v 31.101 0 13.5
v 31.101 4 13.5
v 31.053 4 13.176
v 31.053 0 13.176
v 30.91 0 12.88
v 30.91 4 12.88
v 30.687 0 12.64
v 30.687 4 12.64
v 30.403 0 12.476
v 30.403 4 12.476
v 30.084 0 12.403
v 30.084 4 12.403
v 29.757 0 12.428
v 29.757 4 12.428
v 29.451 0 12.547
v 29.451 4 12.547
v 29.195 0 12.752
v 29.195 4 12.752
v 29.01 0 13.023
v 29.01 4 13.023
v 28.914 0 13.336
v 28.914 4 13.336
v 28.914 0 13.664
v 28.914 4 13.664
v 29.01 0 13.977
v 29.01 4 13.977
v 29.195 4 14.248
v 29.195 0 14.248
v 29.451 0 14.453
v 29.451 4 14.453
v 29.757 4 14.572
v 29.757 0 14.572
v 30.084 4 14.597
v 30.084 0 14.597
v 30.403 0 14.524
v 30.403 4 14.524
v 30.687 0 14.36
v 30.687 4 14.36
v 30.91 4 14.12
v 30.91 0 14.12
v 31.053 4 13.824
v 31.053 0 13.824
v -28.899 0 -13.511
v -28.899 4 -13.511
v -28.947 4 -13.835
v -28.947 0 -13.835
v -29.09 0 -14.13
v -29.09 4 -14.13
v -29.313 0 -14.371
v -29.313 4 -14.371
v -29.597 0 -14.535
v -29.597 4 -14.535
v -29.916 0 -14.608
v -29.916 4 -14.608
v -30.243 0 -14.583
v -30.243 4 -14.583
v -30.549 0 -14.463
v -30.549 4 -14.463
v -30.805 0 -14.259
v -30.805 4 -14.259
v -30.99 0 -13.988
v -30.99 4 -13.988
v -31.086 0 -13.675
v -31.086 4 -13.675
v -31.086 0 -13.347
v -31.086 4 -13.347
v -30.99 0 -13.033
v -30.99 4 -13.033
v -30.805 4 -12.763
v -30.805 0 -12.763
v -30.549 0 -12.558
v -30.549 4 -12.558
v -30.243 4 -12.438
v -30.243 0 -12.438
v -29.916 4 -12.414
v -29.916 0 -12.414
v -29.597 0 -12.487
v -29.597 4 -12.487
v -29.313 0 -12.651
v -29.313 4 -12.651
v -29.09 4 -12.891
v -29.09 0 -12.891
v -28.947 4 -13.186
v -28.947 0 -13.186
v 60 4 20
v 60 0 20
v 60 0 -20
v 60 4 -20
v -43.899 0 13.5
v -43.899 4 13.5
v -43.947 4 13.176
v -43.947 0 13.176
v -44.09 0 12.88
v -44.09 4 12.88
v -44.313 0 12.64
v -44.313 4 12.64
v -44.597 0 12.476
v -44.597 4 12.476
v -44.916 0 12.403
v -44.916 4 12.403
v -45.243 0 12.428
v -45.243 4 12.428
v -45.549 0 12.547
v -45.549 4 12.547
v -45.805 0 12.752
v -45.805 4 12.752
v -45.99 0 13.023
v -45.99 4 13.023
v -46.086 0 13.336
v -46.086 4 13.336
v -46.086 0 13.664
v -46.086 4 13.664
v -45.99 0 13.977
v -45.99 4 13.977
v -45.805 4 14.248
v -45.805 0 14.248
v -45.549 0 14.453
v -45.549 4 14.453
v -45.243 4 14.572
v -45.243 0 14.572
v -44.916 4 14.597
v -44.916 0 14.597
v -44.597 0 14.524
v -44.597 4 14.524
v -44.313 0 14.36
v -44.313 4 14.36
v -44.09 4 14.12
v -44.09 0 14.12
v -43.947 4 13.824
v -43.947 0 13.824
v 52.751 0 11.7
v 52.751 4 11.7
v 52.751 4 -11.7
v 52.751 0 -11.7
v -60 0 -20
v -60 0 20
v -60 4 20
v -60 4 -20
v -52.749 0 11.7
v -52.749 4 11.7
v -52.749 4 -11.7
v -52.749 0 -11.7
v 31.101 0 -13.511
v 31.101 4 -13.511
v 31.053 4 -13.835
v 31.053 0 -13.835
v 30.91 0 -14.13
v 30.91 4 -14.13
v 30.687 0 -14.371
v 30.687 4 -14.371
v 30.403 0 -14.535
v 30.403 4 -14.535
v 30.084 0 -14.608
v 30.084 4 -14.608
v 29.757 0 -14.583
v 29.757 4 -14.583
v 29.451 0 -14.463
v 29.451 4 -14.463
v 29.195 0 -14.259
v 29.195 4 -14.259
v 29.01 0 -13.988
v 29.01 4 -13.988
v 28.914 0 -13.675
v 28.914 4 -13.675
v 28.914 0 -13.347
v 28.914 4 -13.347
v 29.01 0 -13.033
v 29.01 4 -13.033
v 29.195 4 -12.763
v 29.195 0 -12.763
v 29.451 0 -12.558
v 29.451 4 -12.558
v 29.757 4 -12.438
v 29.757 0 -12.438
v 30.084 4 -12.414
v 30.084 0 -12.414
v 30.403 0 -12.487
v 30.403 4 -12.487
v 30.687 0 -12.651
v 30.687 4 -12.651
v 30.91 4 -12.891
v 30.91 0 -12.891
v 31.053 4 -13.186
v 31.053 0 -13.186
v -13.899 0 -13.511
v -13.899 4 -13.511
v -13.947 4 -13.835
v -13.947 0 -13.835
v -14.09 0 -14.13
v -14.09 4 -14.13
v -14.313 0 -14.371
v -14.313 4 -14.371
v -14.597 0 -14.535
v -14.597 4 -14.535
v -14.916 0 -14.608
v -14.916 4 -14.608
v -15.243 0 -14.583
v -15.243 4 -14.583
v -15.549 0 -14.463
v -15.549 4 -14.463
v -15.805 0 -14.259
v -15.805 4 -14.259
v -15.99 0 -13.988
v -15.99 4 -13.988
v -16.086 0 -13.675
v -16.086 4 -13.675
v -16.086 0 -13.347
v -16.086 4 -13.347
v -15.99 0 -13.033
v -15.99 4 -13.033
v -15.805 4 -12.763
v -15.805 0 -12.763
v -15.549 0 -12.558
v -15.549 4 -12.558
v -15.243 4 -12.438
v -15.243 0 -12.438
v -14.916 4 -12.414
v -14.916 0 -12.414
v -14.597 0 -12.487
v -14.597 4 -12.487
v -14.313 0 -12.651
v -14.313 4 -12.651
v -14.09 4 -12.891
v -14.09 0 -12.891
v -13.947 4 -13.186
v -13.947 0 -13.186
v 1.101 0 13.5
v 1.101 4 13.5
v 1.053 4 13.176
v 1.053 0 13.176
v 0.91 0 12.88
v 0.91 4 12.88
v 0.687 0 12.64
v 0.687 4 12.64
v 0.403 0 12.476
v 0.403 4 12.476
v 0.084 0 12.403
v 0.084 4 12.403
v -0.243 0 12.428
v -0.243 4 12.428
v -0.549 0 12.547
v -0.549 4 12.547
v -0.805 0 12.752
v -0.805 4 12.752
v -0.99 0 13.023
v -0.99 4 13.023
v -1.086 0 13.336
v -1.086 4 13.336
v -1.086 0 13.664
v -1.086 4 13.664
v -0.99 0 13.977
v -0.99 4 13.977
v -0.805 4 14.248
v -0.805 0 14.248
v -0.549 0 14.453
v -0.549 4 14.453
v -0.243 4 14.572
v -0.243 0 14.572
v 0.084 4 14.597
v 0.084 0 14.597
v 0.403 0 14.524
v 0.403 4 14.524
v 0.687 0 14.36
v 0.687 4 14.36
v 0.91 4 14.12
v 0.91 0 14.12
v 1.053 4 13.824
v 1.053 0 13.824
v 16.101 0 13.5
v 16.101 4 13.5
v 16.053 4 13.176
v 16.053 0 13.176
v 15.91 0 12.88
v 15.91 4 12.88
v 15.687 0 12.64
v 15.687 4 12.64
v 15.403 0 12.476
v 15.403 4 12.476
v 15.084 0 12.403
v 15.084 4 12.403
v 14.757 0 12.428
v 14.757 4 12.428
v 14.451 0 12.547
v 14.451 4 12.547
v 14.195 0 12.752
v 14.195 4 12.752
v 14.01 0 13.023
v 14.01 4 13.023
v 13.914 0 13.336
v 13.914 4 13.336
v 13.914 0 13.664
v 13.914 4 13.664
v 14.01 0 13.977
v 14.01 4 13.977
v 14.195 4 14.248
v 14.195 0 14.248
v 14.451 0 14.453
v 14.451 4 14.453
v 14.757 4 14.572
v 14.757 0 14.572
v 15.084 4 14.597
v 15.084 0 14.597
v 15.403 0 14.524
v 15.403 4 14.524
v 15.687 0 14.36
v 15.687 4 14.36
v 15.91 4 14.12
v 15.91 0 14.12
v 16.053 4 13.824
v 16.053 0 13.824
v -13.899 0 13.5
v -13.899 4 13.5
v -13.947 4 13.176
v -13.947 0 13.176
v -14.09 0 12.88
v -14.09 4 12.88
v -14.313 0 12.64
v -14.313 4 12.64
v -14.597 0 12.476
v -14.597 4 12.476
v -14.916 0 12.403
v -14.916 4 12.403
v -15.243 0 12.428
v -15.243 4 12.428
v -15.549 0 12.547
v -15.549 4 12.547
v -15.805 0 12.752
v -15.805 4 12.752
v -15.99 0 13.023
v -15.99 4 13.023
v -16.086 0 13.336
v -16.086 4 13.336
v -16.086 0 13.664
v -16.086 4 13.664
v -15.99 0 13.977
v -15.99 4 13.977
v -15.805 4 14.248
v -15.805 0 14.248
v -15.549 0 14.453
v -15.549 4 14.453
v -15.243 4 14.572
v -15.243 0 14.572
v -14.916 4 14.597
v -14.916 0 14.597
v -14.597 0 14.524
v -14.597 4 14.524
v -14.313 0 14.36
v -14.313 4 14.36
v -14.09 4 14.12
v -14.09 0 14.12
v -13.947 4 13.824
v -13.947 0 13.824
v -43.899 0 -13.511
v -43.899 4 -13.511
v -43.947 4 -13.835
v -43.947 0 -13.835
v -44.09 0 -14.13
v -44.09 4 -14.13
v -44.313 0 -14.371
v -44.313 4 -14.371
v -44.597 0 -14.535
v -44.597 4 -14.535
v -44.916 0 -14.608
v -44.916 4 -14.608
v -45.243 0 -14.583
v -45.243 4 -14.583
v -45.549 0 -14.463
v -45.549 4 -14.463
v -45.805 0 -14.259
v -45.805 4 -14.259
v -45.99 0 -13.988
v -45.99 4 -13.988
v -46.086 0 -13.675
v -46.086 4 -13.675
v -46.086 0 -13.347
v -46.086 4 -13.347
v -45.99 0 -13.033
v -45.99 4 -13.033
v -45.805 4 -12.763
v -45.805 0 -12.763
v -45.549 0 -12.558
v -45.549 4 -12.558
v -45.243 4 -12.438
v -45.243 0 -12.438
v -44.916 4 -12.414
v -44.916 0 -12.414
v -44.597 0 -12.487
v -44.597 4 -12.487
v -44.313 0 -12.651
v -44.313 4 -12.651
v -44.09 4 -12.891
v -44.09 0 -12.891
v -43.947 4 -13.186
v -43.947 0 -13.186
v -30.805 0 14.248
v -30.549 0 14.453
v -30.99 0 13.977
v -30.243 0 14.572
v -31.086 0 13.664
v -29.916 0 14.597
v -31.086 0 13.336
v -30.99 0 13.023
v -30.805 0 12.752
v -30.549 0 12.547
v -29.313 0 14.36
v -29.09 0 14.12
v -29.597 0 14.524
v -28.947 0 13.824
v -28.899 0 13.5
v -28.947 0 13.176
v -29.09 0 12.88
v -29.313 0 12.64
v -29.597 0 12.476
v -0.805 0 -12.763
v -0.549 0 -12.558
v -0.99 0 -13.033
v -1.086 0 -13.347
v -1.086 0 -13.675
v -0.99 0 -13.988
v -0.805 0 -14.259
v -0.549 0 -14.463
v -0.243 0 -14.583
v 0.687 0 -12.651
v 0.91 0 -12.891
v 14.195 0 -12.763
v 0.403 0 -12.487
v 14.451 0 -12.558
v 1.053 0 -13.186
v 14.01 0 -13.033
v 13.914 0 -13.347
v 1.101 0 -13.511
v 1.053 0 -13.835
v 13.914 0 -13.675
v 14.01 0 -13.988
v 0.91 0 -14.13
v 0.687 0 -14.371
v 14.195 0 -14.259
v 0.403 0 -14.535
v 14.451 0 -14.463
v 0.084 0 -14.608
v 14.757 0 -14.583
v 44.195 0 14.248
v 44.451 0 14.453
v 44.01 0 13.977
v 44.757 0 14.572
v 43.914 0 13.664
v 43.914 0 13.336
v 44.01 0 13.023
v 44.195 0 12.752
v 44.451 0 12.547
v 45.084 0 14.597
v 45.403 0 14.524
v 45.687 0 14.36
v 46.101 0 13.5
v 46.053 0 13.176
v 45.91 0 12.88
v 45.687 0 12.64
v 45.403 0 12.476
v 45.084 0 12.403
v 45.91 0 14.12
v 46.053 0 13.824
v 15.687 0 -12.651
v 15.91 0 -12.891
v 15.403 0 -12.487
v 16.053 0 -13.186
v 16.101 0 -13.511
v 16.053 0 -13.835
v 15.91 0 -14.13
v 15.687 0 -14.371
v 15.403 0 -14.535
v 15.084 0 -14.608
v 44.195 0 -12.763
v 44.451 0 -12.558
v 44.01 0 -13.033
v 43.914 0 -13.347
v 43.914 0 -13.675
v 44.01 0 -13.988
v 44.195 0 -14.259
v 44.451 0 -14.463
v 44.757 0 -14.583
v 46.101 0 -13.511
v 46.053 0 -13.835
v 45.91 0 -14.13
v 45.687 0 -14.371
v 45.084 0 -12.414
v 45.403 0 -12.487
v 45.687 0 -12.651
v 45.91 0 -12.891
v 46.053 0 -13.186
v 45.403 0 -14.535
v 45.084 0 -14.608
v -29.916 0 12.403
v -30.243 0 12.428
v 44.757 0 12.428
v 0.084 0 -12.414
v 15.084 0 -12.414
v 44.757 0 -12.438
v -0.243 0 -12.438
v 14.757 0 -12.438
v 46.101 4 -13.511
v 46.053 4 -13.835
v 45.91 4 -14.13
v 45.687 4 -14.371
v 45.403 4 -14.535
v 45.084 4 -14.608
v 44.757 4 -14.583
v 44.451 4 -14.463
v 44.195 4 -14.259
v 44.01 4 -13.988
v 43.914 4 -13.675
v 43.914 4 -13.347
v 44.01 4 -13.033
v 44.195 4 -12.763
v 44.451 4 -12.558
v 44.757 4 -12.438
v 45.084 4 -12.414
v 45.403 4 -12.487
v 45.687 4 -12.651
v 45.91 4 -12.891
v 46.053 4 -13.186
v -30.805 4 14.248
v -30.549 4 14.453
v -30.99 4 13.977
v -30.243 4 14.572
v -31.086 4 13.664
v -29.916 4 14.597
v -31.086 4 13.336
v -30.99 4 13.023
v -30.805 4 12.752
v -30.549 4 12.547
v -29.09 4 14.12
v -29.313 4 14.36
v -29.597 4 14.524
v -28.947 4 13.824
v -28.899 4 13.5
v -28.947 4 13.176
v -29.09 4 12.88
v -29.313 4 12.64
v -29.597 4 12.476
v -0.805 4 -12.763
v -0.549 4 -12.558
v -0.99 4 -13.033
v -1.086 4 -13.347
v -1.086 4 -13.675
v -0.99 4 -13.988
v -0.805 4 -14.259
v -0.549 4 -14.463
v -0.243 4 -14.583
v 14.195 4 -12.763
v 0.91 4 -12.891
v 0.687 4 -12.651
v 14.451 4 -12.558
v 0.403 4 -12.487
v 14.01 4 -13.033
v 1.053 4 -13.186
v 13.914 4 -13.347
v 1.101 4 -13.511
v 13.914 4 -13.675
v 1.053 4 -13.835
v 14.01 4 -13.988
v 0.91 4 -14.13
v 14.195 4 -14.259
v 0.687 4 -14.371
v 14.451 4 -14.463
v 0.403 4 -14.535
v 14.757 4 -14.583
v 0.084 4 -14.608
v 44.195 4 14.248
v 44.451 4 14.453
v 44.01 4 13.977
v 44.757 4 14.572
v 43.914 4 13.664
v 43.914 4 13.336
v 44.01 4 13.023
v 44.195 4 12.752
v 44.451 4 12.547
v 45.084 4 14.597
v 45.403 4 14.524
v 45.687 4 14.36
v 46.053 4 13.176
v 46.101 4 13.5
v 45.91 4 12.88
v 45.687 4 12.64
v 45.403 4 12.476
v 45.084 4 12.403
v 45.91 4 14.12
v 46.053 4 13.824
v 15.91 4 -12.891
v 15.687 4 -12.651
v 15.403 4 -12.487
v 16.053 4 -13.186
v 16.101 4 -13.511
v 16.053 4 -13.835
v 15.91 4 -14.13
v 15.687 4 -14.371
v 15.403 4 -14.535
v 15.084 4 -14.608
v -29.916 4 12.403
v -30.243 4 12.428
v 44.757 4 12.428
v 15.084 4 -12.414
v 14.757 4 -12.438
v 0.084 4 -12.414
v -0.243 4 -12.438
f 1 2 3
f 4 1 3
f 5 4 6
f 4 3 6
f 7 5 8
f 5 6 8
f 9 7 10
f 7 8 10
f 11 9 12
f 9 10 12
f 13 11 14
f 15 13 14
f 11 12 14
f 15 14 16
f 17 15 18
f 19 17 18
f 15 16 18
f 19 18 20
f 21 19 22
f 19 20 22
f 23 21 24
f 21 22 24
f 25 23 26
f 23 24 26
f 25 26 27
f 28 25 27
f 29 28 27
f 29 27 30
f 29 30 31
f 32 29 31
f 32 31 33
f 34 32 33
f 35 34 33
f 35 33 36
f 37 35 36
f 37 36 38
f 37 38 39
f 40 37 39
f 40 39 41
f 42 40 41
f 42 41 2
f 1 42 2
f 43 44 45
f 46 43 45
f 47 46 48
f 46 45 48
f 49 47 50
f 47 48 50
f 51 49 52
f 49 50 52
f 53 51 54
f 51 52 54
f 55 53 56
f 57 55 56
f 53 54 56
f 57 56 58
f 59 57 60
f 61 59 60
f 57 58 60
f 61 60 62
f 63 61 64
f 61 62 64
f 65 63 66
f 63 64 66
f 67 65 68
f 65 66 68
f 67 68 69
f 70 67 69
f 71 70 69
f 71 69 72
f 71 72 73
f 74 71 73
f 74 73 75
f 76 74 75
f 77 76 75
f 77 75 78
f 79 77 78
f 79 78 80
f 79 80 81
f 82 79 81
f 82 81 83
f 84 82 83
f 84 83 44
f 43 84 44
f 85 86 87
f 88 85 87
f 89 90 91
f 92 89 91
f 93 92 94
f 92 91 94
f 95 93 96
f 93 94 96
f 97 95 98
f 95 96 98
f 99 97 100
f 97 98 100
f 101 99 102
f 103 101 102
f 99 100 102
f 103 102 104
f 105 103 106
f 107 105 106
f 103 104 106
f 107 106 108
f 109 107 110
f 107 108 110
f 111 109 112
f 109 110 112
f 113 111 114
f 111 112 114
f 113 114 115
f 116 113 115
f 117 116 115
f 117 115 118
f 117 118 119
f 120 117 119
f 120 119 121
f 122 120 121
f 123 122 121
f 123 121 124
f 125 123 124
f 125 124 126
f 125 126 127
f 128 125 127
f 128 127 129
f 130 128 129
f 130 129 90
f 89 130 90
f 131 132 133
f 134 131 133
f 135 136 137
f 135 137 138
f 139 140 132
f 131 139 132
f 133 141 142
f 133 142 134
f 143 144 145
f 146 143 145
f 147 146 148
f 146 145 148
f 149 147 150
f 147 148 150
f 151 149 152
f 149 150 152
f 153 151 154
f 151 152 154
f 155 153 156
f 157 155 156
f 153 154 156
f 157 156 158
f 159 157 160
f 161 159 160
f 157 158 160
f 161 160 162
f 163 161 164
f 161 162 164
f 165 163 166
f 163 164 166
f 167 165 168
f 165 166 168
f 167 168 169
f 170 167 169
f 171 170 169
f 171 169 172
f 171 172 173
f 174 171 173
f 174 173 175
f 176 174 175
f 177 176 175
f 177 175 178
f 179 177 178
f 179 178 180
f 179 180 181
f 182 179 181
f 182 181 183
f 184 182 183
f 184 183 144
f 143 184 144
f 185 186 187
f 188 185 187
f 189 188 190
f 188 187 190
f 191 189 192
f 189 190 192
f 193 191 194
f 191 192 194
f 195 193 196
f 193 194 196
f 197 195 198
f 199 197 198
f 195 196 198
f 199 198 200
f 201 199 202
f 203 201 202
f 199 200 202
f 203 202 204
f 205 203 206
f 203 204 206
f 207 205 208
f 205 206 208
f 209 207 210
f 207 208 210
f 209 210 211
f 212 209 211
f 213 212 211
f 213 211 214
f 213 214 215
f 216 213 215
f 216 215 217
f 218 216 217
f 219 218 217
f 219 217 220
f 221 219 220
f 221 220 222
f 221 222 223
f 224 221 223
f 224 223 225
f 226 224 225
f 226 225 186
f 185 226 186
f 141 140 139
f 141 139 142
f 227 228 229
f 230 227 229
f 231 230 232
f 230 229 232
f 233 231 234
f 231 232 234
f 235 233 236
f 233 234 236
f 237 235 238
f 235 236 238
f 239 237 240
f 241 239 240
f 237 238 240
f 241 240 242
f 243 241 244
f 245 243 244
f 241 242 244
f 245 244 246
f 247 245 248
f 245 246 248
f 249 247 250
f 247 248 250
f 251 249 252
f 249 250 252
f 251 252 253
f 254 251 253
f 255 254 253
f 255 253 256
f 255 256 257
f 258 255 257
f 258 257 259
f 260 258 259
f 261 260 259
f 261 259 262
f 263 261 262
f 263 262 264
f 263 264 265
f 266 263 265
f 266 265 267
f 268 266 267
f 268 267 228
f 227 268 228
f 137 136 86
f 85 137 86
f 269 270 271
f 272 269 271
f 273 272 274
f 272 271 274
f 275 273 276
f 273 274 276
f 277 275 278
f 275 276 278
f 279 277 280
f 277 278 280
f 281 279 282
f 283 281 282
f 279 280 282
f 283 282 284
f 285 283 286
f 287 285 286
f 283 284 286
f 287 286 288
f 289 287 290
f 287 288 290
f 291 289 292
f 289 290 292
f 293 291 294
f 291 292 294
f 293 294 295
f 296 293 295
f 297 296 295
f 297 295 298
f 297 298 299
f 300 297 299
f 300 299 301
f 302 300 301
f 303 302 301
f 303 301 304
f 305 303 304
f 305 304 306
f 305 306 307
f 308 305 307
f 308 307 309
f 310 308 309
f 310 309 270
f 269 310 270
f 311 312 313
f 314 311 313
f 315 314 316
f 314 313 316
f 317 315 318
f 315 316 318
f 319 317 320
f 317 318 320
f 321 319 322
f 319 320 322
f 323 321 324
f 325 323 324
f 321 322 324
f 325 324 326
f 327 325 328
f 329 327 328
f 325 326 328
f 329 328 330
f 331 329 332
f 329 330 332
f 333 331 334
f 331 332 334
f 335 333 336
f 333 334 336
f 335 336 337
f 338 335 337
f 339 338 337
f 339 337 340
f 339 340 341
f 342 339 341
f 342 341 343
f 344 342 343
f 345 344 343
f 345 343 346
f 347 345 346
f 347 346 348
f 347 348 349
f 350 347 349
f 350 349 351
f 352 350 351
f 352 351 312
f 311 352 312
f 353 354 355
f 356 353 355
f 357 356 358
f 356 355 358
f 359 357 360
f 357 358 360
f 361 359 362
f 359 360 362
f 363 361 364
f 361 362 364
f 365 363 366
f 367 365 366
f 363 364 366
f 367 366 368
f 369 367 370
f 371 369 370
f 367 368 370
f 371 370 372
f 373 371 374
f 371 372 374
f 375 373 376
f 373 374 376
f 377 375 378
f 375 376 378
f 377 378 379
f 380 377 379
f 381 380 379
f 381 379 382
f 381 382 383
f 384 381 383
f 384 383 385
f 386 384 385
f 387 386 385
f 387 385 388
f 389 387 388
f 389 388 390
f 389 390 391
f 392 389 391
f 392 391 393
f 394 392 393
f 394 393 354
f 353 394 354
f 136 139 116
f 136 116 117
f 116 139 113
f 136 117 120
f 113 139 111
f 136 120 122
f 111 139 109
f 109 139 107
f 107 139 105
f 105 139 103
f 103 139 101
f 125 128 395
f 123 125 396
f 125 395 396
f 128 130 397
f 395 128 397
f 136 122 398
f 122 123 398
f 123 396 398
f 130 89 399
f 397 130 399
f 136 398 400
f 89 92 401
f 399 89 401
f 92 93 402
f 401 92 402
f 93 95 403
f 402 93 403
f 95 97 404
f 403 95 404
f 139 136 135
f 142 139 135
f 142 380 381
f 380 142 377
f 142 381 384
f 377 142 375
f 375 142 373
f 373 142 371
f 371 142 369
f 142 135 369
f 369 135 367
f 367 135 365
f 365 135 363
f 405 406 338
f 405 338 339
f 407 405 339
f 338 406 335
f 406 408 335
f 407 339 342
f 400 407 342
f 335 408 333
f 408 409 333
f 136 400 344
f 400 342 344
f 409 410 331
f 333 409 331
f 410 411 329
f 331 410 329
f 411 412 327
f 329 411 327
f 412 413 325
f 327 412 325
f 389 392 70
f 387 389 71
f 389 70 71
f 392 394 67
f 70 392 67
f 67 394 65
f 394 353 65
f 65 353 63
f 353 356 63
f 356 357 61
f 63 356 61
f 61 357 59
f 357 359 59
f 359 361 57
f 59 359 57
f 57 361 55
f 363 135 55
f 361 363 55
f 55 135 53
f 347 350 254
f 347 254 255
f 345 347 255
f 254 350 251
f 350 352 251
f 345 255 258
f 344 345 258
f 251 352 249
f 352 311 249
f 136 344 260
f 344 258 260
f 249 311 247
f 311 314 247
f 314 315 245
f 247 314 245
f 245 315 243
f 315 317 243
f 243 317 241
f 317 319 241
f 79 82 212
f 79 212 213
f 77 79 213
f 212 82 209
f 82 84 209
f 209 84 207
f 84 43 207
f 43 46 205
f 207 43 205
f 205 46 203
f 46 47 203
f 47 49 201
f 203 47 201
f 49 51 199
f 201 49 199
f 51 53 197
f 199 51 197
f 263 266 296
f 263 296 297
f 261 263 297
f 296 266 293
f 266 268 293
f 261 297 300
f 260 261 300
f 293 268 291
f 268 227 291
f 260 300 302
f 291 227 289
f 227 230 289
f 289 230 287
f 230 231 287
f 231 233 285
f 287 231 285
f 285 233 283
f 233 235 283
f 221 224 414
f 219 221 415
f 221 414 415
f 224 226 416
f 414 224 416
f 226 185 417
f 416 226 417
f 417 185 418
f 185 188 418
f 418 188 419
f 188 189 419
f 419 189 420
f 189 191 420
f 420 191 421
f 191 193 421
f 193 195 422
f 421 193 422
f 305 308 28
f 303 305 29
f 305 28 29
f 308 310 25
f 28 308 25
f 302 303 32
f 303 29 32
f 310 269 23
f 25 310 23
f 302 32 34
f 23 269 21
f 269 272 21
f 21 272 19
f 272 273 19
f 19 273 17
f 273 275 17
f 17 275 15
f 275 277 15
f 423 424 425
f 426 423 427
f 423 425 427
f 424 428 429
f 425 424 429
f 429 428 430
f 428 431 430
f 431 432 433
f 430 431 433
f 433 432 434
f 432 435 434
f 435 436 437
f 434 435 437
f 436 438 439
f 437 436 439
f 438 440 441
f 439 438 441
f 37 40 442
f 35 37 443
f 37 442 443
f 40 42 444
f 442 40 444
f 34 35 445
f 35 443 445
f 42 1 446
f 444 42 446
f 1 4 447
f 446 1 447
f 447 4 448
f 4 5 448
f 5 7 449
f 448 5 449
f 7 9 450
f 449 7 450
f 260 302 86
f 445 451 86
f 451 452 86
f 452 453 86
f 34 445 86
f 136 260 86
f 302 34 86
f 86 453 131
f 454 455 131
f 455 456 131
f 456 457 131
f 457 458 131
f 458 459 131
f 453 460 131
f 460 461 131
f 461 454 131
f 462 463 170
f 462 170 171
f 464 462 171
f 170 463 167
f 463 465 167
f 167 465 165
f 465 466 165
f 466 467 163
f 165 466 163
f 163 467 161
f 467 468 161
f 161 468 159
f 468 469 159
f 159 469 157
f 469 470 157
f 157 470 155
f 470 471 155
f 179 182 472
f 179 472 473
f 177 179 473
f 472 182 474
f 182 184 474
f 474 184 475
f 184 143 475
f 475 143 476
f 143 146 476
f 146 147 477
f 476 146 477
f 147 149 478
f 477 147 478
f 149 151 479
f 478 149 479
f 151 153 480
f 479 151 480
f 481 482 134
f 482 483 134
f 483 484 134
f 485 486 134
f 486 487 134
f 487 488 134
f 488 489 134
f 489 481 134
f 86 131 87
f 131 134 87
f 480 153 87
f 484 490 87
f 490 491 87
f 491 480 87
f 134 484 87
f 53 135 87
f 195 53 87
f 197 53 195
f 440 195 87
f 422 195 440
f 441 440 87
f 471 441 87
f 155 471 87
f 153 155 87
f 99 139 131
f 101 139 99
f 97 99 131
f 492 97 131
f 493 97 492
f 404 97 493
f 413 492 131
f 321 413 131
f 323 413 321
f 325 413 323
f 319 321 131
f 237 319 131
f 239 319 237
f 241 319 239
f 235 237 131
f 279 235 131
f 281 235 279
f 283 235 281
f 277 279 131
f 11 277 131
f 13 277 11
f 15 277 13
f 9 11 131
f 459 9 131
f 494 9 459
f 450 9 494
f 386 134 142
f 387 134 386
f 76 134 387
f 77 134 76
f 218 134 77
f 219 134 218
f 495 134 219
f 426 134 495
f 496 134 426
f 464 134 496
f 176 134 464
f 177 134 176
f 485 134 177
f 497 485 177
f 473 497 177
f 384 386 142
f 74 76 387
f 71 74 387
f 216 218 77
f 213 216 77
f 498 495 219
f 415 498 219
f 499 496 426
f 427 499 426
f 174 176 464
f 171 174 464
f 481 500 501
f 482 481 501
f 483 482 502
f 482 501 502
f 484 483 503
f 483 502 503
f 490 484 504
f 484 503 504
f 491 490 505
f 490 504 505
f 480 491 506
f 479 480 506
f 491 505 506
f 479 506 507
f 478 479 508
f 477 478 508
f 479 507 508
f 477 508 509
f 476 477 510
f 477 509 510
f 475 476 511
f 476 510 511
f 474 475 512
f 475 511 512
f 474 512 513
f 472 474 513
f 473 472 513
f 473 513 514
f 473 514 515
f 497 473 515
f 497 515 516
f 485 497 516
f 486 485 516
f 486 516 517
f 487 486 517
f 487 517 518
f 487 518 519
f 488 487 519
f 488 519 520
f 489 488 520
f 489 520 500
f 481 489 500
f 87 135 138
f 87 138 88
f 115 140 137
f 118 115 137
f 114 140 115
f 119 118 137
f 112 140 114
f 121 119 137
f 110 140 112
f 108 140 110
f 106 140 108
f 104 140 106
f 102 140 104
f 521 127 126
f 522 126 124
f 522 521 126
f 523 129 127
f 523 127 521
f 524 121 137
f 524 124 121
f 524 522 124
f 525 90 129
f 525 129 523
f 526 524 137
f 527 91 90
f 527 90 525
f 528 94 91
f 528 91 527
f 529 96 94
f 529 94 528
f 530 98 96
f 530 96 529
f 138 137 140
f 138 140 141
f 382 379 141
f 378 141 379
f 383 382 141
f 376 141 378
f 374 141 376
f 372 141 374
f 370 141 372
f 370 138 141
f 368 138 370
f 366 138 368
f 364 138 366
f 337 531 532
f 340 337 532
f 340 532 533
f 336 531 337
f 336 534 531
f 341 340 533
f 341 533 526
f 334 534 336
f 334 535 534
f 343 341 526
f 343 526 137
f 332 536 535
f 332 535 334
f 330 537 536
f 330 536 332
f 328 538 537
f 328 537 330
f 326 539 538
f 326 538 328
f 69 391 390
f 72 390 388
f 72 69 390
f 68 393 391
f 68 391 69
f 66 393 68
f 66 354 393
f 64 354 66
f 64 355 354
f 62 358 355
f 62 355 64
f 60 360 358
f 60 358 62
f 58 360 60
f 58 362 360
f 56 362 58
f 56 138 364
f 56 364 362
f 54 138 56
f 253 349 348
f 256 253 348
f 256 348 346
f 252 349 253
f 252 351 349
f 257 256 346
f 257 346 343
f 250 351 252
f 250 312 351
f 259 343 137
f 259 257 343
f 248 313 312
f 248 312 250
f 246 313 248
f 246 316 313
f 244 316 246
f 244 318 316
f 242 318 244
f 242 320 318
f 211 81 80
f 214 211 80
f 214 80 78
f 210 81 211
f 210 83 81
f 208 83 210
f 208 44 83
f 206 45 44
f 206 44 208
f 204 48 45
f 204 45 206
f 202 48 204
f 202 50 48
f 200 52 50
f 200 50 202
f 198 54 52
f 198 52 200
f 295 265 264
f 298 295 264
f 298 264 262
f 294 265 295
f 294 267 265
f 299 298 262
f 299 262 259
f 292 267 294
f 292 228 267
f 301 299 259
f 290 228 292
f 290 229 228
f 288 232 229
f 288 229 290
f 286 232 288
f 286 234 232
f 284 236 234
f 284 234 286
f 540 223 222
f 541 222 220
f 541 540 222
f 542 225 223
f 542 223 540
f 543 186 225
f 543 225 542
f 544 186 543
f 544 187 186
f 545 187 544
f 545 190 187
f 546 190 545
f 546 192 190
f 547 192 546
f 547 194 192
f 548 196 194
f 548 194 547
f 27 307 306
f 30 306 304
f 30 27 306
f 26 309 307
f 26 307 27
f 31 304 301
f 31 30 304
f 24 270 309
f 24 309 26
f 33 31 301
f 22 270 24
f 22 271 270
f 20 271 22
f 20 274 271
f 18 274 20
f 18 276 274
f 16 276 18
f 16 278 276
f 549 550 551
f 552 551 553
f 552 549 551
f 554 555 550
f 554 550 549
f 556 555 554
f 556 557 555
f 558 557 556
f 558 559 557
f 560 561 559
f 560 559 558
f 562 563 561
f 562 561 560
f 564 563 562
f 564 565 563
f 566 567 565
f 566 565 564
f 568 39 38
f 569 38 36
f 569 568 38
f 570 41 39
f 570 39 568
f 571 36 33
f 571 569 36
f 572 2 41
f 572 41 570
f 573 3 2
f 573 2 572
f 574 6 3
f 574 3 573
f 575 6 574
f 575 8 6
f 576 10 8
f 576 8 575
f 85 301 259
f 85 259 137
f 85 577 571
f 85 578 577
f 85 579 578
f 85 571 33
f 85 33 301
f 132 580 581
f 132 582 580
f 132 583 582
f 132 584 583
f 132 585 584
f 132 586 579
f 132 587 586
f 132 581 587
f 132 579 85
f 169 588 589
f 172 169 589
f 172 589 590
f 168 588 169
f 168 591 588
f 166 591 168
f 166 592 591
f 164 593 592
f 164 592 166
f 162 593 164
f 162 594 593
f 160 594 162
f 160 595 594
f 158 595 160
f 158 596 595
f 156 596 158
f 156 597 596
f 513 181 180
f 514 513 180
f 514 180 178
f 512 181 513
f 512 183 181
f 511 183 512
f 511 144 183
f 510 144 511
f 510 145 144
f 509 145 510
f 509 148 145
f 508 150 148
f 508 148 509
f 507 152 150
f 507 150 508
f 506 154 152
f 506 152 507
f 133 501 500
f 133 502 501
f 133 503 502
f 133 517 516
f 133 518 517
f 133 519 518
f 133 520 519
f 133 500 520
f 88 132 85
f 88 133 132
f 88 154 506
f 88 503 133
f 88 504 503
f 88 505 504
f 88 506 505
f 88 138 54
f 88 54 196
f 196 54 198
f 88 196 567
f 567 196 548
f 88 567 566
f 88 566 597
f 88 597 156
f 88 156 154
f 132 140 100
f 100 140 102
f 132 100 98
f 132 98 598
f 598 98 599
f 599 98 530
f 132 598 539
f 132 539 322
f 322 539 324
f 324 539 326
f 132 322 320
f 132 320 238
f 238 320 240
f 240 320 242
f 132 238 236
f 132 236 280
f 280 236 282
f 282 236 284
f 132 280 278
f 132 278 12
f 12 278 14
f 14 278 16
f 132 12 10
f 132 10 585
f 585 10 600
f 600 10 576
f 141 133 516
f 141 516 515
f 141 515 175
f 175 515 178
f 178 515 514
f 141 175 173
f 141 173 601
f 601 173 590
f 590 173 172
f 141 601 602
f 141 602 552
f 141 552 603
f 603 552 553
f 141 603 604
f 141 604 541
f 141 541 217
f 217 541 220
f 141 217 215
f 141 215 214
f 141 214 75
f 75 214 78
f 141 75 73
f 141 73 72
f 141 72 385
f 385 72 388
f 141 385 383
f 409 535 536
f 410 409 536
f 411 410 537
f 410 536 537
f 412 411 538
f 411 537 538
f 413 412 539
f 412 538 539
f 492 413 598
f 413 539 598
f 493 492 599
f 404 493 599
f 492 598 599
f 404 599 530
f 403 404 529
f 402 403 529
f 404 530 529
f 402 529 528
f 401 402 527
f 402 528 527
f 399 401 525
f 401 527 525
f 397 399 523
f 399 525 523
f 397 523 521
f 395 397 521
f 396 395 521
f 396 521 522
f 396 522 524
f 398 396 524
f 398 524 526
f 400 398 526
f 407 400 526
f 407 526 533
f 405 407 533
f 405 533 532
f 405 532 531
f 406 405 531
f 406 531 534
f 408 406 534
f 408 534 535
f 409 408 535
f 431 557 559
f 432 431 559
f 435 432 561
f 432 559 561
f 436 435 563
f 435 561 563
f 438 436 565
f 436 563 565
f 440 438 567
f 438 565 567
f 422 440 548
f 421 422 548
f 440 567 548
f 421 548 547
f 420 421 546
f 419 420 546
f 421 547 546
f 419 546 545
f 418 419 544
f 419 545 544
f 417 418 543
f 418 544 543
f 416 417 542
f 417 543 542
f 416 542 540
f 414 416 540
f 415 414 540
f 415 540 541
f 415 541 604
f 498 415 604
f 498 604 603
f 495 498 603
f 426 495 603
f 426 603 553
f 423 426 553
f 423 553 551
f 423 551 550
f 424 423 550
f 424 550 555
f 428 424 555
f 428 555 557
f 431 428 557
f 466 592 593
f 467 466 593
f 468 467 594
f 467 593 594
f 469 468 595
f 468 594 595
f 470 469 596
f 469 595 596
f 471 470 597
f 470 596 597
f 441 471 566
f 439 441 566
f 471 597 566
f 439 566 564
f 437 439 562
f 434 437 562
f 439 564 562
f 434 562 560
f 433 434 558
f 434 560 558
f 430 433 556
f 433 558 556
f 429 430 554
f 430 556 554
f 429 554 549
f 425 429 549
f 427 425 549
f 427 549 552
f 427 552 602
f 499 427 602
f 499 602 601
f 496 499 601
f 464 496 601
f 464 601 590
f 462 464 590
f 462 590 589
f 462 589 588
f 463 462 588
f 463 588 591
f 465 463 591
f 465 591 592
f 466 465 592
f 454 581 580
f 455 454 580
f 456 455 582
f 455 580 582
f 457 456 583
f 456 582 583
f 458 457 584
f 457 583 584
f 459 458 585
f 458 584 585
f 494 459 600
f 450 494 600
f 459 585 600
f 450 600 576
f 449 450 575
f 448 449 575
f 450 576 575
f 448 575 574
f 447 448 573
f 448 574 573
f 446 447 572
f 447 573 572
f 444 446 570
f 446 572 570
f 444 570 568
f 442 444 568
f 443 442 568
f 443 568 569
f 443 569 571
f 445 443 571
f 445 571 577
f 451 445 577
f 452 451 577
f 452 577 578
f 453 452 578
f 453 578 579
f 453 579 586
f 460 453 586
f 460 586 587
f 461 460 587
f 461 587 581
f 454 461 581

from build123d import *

# Parameters (mm, degrees)
SKETCH1_W           = 120
SKETCH1_H           = 40
BOSS_EXTRUDE1_DEPTH = 4
SKETCH2_R           = 1.1
SKETCH2_W           = 12.5
SKETCH2_H           = 23
CUT_EXTRUDE1_DEPTH  = 5
SKETCH3_W           = 105.5
SKETCH3_H           = 23.4
CUT_EXTRUDE2_DEPTH  = 5


with BuildPart() as part:
    # Sketch1 → Boss-Extrude1 (new body)
    with BuildSketch(Plane(origin=(0, 0, 0), x_dir=(1, 0, 0), z_dir=(0, 1, 0))):
        Rectangle(SKETCH1_W, SKETCH1_H)
    extrude(amount=BOSS_EXTRUDE1_DEPTH)

    # Sketch2 → Cut-Extrude1 (cut, through all)
    with BuildSketch(Plane(origin=(0, 4, 0), x_dir=(1, 0, 0), z_dir=(0, 1, 0))):
        with Locations((-44.998568235, 13.510712966)):
            Circle(SKETCH2_R)
        with Locations((-44.998568235, -13.5)):
            Circle(SKETCH2_R)
        with Locations((-29.998568235, 13.510712966)):
            Circle(SKETCH2_R)
        with Locations((-29.998568235, -13.5)):
            Circle(SKETCH2_R)
        with Locations((-14.998568235, 13.510712966)):
            Circle(SKETCH2_R)
        with Locations((-14.998568235, -13.5)):
            Circle(SKETCH2_R)
        with Locations((0.001431765, 13.510712966)):
            Circle(SKETCH2_R)
        with Locations((0.001431765, -13.5)):
            Circle(SKETCH2_R)
        with Locations((15.001431765, 13.510712966)):
            Circle(SKETCH2_R)
        with Locations((15.001431765, -13.5)):
            Circle(SKETCH2_R)
        with Locations((30.001431765, 13.510712966)):
            Circle(SKETCH2_R)
        with Locations((30.001431765, -13.5)):
            Circle(SKETCH2_R)
        with Locations((45.001431765, 13.510712966)):
            Circle(SKETCH2_R)
        with Locations((45.001431765, -13.5)):
            Circle(SKETCH2_R)
        with Locations((-29.998568235, 0)):
            Rectangle(SKETCH2_W, SKETCH2_H)
        with Locations((-44.998568235, 0)):
            Rectangle(SKETCH2_W, SKETCH2_H)
        with Locations((-14.998568235, 0)):
            Rectangle(SKETCH2_W, SKETCH2_H)
        with Locations((0.001431765, 0)):
            Rectangle(SKETCH2_W, SKETCH2_H)
        with Locations((15.001431765, 0)):
            Rectangle(SKETCH2_W, SKETCH2_H)
        with Locations((30.001431765, 0)):
            Rectangle(SKETCH2_W, SKETCH2_H)
        with Locations((45.001431765, 0)):
            Rectangle(SKETCH2_W, SKETCH2_H)
    extrude(amount=-CUT_EXTRUDE1_DEPTH, mode=Mode.SUBTRACT)

    # Sketch3 → Cut-Extrude2 (cut, through all)
    with BuildSketch(Plane(origin=(0, 4, 0), x_dir=(1, 0, 0), z_dir=(0, 1, 0))):
        with Locations((0.001431765, 0)):
            Rectangle(SKETCH3_W, SKETCH3_H)
    extrude(amount=-CUT_EXTRUDE2_DEPTH, mode=Mode.SUBTRACT)


solid = part.part
